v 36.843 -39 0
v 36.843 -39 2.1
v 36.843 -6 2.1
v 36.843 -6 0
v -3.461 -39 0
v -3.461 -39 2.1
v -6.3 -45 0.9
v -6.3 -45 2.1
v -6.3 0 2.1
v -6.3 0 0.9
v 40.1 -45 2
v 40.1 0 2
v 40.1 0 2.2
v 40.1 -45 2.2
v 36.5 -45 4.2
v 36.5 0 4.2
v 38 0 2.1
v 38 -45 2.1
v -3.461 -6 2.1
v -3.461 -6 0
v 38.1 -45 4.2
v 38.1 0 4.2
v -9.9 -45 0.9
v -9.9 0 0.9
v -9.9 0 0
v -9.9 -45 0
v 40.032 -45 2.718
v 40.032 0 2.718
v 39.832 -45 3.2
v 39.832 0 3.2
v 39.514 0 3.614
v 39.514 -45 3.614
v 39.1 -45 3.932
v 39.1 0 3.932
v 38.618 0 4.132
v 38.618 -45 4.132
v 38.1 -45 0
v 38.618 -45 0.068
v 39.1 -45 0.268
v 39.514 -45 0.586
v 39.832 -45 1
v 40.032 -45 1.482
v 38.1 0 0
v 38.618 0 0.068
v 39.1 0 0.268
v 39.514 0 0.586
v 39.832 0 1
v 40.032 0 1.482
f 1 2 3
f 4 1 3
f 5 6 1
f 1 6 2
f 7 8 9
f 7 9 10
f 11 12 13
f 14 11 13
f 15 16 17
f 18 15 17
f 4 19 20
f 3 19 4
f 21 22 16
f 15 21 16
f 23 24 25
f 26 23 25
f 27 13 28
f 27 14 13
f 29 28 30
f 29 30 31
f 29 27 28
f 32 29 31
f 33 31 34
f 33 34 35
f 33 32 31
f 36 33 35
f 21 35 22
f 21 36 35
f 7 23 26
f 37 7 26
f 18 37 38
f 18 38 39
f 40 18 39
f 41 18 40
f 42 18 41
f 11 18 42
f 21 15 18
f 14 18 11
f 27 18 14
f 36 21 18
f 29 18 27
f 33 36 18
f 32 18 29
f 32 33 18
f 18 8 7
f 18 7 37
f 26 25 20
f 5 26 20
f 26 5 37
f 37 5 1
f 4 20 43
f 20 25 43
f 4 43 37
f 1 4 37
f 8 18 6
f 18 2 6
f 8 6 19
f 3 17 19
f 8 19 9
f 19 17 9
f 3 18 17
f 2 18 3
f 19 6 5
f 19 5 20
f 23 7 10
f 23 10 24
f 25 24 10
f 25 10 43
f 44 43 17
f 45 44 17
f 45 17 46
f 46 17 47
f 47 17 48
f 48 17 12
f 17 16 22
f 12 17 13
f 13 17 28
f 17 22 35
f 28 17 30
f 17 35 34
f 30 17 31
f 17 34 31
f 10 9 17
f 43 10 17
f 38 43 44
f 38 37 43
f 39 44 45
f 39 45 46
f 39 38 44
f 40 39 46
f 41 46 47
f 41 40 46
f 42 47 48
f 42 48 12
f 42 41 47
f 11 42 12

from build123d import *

# Parameters (mm, degrees)
F1_DEPTH = 45
F2_R     = 2
F3_W     = 40.303819
F3_H     = 33
F4_DEPTH = 2.1


with BuildPart() as f1:
    # F0 (on Front) → F1 (new body)
    with BuildSketch(Plane.XZ):
        Polygon((-6.300002, 0.9), (-9.900002, 0.9), (-9.900002, 0), (40.099998, 0), (40.099998, 2.1), (37.999998, 2.1), (-6.300002, 2.1), align=None)
        Polygon((37.999998, 2.1), (40.099998, 2.1), (40.099998, 4.2), (36.499998, 4.2), align=None)
    extrude(amount=F1_DEPTH)

    # F2
    f2_edges = [f1.edges().sort_by_distance(p)[0] for p in [
        (40.099998, -22.5, 4.2),
        (40.099998, -22.5, 0),
    ]]
    fillet(f2_edges, radius=F2_R)

    # F3 (on face) → F4 (cut)
    with BuildSketch(Plane.XY.offset(2.1)):
        with Locations((16.690705, -22.5)):
            Rectangle(F3_W, F3_H)
    extrude(amount=-F4_DEPTH, mode=Mode.SUBTRACT)


solid = f1.part
